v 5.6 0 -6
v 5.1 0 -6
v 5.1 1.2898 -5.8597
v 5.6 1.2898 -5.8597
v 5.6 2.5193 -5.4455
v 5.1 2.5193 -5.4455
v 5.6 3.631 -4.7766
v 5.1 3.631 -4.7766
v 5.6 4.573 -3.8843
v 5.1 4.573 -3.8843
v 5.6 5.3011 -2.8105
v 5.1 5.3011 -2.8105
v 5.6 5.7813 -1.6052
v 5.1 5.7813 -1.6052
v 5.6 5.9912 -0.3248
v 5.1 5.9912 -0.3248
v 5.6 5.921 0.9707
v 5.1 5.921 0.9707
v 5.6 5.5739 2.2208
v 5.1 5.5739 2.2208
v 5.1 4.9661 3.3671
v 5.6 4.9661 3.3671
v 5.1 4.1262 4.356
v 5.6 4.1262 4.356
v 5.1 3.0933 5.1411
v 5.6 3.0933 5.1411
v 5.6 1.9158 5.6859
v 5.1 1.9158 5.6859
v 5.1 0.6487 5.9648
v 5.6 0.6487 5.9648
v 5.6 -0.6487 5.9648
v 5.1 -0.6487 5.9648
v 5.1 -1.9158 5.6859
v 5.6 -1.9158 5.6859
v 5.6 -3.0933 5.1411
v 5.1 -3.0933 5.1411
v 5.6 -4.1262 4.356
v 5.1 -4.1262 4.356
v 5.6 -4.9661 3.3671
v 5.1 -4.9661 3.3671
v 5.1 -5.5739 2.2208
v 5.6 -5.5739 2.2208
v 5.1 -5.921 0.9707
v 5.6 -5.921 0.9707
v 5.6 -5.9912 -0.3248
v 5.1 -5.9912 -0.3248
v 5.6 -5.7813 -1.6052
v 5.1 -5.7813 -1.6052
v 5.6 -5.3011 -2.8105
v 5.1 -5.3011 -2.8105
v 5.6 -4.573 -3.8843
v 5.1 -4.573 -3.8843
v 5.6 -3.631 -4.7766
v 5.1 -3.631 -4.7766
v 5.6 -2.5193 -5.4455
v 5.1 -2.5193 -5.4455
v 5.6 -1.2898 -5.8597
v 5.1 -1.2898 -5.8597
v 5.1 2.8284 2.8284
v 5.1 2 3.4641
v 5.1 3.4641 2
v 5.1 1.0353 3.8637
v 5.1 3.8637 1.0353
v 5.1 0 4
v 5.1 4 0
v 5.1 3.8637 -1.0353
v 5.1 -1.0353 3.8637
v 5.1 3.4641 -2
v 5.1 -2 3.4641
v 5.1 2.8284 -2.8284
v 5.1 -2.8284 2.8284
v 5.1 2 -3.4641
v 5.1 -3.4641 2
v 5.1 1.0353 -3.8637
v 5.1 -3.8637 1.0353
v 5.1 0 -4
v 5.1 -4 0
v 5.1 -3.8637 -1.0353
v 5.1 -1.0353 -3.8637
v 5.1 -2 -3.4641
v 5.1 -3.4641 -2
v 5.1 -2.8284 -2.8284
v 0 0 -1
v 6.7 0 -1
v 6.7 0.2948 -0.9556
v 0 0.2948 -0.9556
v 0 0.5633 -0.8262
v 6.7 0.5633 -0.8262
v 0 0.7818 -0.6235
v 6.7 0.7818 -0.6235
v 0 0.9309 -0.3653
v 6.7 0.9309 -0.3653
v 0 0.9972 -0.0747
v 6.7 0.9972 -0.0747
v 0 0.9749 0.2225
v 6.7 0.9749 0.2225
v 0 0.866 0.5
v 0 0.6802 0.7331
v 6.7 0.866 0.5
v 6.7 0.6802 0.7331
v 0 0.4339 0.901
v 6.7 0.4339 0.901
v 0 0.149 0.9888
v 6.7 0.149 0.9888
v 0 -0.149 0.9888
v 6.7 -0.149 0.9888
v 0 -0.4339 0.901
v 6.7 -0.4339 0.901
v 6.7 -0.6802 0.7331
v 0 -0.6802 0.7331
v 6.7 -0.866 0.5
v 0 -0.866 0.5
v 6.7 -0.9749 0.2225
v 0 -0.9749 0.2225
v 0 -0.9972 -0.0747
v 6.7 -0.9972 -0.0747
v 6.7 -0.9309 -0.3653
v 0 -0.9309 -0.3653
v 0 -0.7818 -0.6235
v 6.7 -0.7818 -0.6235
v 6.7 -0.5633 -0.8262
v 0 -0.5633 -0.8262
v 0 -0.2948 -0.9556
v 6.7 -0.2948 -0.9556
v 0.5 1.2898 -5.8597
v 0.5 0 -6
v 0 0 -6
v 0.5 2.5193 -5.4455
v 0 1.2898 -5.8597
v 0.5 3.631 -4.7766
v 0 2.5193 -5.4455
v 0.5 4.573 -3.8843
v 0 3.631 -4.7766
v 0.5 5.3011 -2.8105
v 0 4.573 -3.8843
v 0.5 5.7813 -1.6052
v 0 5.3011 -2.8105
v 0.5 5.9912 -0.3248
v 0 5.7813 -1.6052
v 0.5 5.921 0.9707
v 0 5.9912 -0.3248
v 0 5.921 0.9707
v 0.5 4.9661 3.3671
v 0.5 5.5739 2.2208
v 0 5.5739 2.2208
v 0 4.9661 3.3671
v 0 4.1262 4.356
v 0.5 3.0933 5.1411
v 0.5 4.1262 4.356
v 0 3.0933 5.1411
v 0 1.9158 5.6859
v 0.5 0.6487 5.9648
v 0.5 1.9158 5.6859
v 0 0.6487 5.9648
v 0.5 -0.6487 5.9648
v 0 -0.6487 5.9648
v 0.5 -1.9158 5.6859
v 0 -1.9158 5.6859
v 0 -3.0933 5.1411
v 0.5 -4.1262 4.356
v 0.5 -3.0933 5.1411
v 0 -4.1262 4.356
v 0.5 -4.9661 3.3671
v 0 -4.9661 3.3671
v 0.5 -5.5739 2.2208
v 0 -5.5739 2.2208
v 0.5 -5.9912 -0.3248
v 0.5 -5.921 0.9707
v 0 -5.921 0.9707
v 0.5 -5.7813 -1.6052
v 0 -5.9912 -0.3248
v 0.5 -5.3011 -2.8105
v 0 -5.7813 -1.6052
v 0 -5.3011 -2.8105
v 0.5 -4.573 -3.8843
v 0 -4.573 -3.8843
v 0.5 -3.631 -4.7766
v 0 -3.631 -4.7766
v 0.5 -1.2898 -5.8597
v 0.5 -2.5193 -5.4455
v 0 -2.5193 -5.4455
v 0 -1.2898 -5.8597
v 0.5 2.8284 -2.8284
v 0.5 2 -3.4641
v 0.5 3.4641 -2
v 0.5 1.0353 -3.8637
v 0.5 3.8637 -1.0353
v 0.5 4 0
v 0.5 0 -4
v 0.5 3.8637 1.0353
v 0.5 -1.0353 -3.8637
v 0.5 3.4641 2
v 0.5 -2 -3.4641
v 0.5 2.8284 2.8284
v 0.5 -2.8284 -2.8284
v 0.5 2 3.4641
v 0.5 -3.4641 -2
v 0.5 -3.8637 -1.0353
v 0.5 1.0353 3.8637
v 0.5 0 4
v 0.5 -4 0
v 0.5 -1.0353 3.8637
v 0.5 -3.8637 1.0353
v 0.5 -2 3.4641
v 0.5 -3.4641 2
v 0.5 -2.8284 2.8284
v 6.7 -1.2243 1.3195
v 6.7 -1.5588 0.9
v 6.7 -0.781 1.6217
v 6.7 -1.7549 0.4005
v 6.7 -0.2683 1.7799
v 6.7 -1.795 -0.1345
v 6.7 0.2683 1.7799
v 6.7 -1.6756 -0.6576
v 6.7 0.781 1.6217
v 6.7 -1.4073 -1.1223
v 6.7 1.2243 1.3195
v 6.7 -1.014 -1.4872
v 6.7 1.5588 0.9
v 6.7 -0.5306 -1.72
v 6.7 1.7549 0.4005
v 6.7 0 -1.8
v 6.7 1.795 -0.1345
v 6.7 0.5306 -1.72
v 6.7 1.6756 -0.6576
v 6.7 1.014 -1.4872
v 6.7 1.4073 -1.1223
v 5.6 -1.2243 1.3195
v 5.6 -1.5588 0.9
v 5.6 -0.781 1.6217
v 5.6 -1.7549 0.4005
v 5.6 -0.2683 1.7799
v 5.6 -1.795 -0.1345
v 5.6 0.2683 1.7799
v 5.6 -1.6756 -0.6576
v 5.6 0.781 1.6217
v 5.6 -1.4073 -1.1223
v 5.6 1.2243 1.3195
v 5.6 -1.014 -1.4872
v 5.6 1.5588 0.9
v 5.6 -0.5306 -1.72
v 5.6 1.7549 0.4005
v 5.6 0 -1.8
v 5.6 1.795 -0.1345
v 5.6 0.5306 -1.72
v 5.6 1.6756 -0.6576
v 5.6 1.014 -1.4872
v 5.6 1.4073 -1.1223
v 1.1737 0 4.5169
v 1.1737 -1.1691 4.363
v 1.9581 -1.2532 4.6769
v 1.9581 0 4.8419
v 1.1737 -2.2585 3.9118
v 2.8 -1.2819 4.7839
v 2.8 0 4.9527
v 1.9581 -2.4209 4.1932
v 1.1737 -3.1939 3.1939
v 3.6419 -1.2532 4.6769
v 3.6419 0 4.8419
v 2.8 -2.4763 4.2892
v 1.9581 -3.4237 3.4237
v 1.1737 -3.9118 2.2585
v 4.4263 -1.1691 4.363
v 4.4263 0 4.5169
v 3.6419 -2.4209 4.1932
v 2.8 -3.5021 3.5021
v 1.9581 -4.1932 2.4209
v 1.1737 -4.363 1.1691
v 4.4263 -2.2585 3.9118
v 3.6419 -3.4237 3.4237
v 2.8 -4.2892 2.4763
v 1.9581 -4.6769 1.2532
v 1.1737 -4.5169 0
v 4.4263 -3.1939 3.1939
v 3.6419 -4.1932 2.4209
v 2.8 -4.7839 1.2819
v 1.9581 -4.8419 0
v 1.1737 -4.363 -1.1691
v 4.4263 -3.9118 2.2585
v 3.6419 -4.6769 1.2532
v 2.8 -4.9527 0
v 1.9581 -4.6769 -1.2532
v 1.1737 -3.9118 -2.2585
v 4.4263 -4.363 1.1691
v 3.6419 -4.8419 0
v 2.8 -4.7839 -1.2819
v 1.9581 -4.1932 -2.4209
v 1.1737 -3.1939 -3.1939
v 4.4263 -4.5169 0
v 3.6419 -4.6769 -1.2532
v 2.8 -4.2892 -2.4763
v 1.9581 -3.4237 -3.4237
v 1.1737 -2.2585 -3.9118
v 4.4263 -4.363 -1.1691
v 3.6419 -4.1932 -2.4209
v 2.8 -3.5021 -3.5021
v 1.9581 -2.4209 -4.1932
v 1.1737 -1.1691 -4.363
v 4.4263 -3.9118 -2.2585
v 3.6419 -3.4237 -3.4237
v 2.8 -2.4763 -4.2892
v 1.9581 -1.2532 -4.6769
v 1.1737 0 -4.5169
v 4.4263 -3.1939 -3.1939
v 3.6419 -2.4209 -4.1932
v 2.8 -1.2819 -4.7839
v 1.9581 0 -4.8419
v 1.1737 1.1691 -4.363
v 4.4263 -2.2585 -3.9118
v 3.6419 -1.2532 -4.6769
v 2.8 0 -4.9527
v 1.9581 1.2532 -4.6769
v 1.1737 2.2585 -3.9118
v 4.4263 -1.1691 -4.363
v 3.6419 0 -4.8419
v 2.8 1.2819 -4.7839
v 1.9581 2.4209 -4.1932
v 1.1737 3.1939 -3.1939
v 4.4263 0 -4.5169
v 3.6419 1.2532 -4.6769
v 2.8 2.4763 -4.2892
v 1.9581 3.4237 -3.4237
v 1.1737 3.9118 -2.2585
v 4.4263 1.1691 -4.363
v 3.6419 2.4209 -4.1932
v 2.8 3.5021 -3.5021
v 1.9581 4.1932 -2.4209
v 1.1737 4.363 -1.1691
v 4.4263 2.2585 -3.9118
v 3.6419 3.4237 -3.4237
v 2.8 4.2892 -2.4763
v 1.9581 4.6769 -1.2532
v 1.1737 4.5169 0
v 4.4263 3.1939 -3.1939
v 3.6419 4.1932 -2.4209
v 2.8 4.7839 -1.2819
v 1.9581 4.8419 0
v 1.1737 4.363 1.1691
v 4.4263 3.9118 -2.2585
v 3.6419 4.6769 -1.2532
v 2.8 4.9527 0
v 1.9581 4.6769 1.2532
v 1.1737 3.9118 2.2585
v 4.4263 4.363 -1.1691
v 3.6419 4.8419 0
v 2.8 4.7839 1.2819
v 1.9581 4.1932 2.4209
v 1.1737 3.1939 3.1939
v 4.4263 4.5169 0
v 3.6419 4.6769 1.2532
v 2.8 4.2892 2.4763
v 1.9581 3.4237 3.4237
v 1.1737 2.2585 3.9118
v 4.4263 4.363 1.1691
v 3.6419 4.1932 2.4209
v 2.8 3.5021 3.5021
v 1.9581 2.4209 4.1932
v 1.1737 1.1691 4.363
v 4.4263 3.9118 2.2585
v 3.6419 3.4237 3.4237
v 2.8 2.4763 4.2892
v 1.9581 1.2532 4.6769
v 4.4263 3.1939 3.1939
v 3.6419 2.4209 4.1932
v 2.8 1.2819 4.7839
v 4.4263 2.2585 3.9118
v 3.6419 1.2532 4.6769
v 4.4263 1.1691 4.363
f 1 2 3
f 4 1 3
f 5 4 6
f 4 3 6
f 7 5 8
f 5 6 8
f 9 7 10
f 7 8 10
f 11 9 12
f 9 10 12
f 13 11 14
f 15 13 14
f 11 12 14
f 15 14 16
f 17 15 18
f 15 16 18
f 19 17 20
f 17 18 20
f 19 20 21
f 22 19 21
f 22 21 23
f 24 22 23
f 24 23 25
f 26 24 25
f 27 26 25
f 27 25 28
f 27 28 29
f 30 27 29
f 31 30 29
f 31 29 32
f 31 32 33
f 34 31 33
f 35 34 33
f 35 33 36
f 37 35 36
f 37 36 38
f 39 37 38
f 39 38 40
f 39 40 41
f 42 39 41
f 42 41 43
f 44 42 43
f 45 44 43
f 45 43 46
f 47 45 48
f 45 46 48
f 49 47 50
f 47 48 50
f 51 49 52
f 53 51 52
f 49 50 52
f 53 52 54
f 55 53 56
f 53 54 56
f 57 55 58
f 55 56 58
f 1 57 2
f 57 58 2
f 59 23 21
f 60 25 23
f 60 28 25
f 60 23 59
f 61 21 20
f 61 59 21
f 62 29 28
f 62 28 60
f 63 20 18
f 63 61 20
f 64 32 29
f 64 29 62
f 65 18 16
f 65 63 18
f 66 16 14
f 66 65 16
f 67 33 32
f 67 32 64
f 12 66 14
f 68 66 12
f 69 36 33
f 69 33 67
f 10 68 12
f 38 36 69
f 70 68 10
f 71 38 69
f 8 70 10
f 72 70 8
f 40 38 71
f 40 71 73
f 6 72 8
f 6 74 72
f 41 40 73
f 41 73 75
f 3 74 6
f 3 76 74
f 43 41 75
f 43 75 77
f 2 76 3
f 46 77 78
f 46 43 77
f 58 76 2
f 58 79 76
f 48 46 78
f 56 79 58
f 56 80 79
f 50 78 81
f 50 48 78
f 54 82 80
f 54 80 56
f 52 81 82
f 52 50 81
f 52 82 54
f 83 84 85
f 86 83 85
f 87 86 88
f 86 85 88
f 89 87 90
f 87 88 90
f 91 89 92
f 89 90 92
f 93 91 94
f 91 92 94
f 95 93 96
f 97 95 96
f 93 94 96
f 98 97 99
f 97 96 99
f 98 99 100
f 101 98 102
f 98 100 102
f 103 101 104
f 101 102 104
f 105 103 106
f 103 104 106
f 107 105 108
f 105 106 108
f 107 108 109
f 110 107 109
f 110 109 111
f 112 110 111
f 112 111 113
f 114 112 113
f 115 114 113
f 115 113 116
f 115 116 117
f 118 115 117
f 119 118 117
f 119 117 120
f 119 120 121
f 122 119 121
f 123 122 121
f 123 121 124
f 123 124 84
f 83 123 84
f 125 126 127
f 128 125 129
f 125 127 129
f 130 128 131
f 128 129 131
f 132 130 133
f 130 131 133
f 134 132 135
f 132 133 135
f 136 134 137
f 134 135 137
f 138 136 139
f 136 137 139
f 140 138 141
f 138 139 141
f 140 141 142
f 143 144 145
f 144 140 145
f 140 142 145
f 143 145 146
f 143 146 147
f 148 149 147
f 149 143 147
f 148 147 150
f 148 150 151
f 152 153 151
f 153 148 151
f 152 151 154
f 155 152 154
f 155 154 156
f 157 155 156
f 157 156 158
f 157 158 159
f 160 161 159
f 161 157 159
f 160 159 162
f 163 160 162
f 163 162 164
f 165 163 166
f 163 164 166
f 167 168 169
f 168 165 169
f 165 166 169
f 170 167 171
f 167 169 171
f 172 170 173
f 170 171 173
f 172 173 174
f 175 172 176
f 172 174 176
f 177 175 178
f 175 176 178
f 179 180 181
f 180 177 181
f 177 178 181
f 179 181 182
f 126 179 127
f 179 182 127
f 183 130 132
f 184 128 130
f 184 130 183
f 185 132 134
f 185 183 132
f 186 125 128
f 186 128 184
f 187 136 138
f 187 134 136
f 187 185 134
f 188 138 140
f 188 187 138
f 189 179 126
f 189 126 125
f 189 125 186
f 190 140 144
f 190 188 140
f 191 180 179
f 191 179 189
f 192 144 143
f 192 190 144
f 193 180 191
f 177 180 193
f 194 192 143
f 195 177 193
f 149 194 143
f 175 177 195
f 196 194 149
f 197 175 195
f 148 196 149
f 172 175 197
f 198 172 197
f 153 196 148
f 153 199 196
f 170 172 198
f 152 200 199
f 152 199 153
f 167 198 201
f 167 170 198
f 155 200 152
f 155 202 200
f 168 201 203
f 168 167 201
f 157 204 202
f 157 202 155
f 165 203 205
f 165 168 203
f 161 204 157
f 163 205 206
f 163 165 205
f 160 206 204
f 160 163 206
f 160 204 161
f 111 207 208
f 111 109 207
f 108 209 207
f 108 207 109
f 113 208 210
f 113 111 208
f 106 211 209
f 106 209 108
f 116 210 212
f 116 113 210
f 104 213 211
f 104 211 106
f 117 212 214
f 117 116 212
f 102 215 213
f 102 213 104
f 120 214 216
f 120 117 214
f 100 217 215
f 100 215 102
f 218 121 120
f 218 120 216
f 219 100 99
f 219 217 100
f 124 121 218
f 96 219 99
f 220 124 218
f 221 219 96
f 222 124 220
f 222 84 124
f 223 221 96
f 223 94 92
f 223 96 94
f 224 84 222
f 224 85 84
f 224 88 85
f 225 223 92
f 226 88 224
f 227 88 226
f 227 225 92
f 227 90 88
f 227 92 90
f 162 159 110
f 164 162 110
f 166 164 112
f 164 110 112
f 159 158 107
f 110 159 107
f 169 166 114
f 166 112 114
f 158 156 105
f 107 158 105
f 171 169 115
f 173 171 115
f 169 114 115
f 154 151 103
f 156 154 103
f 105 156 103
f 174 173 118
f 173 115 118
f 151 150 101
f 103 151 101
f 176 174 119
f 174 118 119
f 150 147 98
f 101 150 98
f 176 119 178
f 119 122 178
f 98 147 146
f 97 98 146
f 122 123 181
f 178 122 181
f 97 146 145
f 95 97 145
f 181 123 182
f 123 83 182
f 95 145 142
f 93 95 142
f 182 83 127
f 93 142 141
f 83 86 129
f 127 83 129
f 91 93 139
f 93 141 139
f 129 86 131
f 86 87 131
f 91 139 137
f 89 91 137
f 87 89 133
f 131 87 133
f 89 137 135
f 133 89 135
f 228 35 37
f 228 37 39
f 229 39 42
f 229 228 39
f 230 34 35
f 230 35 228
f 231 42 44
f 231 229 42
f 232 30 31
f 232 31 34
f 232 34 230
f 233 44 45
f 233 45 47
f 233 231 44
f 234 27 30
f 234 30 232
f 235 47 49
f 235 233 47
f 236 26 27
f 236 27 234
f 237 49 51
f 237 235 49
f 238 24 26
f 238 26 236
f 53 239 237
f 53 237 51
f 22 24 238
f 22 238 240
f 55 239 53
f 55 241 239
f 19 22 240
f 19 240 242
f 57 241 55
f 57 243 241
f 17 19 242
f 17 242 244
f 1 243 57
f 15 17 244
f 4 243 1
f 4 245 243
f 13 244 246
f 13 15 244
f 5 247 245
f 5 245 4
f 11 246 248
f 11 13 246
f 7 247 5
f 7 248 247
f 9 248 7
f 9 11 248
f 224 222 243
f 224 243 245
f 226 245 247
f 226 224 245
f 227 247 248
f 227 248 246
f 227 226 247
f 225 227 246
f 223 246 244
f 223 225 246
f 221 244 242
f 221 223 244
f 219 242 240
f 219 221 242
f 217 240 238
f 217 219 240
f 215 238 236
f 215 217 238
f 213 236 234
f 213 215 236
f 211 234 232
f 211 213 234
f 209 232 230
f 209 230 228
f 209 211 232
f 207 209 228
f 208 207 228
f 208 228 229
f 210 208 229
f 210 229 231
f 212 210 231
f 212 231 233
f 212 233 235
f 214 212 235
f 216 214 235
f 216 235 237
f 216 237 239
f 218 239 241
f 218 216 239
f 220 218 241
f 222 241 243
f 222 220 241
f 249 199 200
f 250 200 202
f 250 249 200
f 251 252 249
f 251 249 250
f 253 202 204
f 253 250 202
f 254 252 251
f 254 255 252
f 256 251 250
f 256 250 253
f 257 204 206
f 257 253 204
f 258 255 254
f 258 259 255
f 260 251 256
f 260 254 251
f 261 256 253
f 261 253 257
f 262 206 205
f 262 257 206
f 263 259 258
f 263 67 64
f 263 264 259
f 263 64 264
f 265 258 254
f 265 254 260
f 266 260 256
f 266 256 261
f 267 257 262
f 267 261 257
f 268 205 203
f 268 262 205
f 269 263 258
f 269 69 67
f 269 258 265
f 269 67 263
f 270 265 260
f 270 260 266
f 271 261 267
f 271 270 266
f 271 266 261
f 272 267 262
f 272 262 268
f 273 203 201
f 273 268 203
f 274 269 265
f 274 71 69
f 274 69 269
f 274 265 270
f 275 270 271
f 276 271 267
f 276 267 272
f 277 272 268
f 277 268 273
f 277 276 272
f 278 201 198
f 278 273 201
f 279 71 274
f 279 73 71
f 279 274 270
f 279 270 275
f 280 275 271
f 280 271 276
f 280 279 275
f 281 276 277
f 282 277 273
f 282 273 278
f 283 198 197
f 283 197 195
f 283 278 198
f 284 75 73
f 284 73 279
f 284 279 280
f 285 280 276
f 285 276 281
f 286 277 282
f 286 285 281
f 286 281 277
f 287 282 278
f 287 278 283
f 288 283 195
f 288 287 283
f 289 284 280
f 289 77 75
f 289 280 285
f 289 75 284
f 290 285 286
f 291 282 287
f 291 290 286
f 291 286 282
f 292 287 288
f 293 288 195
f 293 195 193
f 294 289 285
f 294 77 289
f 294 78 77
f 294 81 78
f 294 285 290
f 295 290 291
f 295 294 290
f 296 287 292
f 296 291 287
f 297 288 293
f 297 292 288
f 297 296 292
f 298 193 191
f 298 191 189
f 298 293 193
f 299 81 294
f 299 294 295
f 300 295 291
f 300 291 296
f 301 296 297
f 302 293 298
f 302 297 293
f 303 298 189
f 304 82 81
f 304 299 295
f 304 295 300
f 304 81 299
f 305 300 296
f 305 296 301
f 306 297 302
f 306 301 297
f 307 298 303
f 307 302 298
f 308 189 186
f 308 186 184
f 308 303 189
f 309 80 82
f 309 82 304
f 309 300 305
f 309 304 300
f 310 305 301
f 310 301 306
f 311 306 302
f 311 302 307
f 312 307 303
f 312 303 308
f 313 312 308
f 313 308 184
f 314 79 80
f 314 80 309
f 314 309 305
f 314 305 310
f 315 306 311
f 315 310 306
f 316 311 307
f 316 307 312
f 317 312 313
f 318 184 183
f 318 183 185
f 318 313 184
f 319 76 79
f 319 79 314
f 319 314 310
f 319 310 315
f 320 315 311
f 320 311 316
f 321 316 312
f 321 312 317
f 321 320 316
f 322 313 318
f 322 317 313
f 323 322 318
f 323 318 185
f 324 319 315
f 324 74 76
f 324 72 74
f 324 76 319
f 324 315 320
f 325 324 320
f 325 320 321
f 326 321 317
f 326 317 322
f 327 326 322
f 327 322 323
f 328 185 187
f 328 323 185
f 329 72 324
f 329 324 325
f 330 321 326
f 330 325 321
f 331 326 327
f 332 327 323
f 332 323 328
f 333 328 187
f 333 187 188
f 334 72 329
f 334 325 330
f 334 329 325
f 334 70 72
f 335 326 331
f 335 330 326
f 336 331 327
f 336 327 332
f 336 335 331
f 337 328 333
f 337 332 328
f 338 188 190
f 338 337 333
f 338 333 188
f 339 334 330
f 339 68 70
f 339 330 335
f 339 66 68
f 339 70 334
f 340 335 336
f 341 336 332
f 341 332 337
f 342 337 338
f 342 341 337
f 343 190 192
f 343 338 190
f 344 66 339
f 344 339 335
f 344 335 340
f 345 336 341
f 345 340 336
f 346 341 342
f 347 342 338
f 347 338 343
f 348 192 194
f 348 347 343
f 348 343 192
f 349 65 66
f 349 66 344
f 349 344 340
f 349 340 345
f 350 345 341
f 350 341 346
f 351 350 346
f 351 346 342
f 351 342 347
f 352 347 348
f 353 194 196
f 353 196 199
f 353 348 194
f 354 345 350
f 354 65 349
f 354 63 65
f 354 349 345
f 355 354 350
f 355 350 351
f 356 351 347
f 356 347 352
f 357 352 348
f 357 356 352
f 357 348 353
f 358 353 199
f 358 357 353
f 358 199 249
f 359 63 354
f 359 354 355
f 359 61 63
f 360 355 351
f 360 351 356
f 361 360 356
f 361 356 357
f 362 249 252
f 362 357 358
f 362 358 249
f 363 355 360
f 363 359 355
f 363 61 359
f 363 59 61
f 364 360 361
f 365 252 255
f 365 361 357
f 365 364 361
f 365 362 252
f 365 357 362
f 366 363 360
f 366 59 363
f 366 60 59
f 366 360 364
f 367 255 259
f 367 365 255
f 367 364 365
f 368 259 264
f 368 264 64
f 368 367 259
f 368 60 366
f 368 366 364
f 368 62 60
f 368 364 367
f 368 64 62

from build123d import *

# Parameters (mm, degrees)
SKETCH1_R           = 6
BOSS_EXTRUDE1_DEPTH = 5.6
SKETCH2_R           = 1
CUT_EXTRUDE1_DEPTH  = 6.7
BOSS_EXTRUDE2_START = 1.1
SKETCH3_R           = 1.8
SKETCH3_R_2         = 1
BOSS_EXTRUDE2_DEPTH = 1.1


with BuildPart() as part:
    # Sketch1 → Boss-Extrude1 (new body)
    with BuildSketch(Plane(origin=(0, 0, 0), x_dir=(0, 0, -1), z_dir=(1, 0, 0))):
        Circle(SKETCH1_R)
    extrude(amount=BOSS_EXTRUDE1_DEPTH)

    # Sketch2 → Cut-Extrude1 (cut)
    with BuildSketch(Plane(origin=(5.6, 0, 0), x_dir=(0, 0, -1), z_dir=(1, 0, 0))):
        Circle(SKETCH2_R)
    extrude(amount=-CUT_EXTRUDE1_DEPTH, mode=Mode.SUBTRACT)

    # Sketch3 → Boss-Extrude2 (add)
    with BuildSketch(Plane(origin=(5.6, 0, 0), x_dir=(0, 0, -1), z_dir=(1, 0, 0)).offset(BOSS_EXTRUDE2_START)):
        Circle(SKETCH3_R)
        Circle(SKETCH3_R_2, mode=Mode.SUBTRACT)
    extrude(amount=-BOSS_EXTRUDE2_DEPTH)

    # Sketch4 → Cut-Revolve1 (revolve, cut)
    with BuildSketch(Plane.XY, mode=Mode.PRIVATE) as cut_revolve1_sk:
        with BuildLine():
            Line((0.5, 6), (0.5, 4))
            ThreePointArc((0.5, 4), (2.8, 4.952691193), (5.1, 4))
            Line((5.1, 4), (5.1, 6))
            Line((5.1, 6), (0.5, 6))
        make_face()
    revolve(cut_revolve1_sk.sketch.rotate(Axis((0, 0, 0), (1, 0, 0)), 90), axis=Axis((0, 0, 0), (1, 0, 0)), mode=Mode.SUBTRACT)


solid = part.part
